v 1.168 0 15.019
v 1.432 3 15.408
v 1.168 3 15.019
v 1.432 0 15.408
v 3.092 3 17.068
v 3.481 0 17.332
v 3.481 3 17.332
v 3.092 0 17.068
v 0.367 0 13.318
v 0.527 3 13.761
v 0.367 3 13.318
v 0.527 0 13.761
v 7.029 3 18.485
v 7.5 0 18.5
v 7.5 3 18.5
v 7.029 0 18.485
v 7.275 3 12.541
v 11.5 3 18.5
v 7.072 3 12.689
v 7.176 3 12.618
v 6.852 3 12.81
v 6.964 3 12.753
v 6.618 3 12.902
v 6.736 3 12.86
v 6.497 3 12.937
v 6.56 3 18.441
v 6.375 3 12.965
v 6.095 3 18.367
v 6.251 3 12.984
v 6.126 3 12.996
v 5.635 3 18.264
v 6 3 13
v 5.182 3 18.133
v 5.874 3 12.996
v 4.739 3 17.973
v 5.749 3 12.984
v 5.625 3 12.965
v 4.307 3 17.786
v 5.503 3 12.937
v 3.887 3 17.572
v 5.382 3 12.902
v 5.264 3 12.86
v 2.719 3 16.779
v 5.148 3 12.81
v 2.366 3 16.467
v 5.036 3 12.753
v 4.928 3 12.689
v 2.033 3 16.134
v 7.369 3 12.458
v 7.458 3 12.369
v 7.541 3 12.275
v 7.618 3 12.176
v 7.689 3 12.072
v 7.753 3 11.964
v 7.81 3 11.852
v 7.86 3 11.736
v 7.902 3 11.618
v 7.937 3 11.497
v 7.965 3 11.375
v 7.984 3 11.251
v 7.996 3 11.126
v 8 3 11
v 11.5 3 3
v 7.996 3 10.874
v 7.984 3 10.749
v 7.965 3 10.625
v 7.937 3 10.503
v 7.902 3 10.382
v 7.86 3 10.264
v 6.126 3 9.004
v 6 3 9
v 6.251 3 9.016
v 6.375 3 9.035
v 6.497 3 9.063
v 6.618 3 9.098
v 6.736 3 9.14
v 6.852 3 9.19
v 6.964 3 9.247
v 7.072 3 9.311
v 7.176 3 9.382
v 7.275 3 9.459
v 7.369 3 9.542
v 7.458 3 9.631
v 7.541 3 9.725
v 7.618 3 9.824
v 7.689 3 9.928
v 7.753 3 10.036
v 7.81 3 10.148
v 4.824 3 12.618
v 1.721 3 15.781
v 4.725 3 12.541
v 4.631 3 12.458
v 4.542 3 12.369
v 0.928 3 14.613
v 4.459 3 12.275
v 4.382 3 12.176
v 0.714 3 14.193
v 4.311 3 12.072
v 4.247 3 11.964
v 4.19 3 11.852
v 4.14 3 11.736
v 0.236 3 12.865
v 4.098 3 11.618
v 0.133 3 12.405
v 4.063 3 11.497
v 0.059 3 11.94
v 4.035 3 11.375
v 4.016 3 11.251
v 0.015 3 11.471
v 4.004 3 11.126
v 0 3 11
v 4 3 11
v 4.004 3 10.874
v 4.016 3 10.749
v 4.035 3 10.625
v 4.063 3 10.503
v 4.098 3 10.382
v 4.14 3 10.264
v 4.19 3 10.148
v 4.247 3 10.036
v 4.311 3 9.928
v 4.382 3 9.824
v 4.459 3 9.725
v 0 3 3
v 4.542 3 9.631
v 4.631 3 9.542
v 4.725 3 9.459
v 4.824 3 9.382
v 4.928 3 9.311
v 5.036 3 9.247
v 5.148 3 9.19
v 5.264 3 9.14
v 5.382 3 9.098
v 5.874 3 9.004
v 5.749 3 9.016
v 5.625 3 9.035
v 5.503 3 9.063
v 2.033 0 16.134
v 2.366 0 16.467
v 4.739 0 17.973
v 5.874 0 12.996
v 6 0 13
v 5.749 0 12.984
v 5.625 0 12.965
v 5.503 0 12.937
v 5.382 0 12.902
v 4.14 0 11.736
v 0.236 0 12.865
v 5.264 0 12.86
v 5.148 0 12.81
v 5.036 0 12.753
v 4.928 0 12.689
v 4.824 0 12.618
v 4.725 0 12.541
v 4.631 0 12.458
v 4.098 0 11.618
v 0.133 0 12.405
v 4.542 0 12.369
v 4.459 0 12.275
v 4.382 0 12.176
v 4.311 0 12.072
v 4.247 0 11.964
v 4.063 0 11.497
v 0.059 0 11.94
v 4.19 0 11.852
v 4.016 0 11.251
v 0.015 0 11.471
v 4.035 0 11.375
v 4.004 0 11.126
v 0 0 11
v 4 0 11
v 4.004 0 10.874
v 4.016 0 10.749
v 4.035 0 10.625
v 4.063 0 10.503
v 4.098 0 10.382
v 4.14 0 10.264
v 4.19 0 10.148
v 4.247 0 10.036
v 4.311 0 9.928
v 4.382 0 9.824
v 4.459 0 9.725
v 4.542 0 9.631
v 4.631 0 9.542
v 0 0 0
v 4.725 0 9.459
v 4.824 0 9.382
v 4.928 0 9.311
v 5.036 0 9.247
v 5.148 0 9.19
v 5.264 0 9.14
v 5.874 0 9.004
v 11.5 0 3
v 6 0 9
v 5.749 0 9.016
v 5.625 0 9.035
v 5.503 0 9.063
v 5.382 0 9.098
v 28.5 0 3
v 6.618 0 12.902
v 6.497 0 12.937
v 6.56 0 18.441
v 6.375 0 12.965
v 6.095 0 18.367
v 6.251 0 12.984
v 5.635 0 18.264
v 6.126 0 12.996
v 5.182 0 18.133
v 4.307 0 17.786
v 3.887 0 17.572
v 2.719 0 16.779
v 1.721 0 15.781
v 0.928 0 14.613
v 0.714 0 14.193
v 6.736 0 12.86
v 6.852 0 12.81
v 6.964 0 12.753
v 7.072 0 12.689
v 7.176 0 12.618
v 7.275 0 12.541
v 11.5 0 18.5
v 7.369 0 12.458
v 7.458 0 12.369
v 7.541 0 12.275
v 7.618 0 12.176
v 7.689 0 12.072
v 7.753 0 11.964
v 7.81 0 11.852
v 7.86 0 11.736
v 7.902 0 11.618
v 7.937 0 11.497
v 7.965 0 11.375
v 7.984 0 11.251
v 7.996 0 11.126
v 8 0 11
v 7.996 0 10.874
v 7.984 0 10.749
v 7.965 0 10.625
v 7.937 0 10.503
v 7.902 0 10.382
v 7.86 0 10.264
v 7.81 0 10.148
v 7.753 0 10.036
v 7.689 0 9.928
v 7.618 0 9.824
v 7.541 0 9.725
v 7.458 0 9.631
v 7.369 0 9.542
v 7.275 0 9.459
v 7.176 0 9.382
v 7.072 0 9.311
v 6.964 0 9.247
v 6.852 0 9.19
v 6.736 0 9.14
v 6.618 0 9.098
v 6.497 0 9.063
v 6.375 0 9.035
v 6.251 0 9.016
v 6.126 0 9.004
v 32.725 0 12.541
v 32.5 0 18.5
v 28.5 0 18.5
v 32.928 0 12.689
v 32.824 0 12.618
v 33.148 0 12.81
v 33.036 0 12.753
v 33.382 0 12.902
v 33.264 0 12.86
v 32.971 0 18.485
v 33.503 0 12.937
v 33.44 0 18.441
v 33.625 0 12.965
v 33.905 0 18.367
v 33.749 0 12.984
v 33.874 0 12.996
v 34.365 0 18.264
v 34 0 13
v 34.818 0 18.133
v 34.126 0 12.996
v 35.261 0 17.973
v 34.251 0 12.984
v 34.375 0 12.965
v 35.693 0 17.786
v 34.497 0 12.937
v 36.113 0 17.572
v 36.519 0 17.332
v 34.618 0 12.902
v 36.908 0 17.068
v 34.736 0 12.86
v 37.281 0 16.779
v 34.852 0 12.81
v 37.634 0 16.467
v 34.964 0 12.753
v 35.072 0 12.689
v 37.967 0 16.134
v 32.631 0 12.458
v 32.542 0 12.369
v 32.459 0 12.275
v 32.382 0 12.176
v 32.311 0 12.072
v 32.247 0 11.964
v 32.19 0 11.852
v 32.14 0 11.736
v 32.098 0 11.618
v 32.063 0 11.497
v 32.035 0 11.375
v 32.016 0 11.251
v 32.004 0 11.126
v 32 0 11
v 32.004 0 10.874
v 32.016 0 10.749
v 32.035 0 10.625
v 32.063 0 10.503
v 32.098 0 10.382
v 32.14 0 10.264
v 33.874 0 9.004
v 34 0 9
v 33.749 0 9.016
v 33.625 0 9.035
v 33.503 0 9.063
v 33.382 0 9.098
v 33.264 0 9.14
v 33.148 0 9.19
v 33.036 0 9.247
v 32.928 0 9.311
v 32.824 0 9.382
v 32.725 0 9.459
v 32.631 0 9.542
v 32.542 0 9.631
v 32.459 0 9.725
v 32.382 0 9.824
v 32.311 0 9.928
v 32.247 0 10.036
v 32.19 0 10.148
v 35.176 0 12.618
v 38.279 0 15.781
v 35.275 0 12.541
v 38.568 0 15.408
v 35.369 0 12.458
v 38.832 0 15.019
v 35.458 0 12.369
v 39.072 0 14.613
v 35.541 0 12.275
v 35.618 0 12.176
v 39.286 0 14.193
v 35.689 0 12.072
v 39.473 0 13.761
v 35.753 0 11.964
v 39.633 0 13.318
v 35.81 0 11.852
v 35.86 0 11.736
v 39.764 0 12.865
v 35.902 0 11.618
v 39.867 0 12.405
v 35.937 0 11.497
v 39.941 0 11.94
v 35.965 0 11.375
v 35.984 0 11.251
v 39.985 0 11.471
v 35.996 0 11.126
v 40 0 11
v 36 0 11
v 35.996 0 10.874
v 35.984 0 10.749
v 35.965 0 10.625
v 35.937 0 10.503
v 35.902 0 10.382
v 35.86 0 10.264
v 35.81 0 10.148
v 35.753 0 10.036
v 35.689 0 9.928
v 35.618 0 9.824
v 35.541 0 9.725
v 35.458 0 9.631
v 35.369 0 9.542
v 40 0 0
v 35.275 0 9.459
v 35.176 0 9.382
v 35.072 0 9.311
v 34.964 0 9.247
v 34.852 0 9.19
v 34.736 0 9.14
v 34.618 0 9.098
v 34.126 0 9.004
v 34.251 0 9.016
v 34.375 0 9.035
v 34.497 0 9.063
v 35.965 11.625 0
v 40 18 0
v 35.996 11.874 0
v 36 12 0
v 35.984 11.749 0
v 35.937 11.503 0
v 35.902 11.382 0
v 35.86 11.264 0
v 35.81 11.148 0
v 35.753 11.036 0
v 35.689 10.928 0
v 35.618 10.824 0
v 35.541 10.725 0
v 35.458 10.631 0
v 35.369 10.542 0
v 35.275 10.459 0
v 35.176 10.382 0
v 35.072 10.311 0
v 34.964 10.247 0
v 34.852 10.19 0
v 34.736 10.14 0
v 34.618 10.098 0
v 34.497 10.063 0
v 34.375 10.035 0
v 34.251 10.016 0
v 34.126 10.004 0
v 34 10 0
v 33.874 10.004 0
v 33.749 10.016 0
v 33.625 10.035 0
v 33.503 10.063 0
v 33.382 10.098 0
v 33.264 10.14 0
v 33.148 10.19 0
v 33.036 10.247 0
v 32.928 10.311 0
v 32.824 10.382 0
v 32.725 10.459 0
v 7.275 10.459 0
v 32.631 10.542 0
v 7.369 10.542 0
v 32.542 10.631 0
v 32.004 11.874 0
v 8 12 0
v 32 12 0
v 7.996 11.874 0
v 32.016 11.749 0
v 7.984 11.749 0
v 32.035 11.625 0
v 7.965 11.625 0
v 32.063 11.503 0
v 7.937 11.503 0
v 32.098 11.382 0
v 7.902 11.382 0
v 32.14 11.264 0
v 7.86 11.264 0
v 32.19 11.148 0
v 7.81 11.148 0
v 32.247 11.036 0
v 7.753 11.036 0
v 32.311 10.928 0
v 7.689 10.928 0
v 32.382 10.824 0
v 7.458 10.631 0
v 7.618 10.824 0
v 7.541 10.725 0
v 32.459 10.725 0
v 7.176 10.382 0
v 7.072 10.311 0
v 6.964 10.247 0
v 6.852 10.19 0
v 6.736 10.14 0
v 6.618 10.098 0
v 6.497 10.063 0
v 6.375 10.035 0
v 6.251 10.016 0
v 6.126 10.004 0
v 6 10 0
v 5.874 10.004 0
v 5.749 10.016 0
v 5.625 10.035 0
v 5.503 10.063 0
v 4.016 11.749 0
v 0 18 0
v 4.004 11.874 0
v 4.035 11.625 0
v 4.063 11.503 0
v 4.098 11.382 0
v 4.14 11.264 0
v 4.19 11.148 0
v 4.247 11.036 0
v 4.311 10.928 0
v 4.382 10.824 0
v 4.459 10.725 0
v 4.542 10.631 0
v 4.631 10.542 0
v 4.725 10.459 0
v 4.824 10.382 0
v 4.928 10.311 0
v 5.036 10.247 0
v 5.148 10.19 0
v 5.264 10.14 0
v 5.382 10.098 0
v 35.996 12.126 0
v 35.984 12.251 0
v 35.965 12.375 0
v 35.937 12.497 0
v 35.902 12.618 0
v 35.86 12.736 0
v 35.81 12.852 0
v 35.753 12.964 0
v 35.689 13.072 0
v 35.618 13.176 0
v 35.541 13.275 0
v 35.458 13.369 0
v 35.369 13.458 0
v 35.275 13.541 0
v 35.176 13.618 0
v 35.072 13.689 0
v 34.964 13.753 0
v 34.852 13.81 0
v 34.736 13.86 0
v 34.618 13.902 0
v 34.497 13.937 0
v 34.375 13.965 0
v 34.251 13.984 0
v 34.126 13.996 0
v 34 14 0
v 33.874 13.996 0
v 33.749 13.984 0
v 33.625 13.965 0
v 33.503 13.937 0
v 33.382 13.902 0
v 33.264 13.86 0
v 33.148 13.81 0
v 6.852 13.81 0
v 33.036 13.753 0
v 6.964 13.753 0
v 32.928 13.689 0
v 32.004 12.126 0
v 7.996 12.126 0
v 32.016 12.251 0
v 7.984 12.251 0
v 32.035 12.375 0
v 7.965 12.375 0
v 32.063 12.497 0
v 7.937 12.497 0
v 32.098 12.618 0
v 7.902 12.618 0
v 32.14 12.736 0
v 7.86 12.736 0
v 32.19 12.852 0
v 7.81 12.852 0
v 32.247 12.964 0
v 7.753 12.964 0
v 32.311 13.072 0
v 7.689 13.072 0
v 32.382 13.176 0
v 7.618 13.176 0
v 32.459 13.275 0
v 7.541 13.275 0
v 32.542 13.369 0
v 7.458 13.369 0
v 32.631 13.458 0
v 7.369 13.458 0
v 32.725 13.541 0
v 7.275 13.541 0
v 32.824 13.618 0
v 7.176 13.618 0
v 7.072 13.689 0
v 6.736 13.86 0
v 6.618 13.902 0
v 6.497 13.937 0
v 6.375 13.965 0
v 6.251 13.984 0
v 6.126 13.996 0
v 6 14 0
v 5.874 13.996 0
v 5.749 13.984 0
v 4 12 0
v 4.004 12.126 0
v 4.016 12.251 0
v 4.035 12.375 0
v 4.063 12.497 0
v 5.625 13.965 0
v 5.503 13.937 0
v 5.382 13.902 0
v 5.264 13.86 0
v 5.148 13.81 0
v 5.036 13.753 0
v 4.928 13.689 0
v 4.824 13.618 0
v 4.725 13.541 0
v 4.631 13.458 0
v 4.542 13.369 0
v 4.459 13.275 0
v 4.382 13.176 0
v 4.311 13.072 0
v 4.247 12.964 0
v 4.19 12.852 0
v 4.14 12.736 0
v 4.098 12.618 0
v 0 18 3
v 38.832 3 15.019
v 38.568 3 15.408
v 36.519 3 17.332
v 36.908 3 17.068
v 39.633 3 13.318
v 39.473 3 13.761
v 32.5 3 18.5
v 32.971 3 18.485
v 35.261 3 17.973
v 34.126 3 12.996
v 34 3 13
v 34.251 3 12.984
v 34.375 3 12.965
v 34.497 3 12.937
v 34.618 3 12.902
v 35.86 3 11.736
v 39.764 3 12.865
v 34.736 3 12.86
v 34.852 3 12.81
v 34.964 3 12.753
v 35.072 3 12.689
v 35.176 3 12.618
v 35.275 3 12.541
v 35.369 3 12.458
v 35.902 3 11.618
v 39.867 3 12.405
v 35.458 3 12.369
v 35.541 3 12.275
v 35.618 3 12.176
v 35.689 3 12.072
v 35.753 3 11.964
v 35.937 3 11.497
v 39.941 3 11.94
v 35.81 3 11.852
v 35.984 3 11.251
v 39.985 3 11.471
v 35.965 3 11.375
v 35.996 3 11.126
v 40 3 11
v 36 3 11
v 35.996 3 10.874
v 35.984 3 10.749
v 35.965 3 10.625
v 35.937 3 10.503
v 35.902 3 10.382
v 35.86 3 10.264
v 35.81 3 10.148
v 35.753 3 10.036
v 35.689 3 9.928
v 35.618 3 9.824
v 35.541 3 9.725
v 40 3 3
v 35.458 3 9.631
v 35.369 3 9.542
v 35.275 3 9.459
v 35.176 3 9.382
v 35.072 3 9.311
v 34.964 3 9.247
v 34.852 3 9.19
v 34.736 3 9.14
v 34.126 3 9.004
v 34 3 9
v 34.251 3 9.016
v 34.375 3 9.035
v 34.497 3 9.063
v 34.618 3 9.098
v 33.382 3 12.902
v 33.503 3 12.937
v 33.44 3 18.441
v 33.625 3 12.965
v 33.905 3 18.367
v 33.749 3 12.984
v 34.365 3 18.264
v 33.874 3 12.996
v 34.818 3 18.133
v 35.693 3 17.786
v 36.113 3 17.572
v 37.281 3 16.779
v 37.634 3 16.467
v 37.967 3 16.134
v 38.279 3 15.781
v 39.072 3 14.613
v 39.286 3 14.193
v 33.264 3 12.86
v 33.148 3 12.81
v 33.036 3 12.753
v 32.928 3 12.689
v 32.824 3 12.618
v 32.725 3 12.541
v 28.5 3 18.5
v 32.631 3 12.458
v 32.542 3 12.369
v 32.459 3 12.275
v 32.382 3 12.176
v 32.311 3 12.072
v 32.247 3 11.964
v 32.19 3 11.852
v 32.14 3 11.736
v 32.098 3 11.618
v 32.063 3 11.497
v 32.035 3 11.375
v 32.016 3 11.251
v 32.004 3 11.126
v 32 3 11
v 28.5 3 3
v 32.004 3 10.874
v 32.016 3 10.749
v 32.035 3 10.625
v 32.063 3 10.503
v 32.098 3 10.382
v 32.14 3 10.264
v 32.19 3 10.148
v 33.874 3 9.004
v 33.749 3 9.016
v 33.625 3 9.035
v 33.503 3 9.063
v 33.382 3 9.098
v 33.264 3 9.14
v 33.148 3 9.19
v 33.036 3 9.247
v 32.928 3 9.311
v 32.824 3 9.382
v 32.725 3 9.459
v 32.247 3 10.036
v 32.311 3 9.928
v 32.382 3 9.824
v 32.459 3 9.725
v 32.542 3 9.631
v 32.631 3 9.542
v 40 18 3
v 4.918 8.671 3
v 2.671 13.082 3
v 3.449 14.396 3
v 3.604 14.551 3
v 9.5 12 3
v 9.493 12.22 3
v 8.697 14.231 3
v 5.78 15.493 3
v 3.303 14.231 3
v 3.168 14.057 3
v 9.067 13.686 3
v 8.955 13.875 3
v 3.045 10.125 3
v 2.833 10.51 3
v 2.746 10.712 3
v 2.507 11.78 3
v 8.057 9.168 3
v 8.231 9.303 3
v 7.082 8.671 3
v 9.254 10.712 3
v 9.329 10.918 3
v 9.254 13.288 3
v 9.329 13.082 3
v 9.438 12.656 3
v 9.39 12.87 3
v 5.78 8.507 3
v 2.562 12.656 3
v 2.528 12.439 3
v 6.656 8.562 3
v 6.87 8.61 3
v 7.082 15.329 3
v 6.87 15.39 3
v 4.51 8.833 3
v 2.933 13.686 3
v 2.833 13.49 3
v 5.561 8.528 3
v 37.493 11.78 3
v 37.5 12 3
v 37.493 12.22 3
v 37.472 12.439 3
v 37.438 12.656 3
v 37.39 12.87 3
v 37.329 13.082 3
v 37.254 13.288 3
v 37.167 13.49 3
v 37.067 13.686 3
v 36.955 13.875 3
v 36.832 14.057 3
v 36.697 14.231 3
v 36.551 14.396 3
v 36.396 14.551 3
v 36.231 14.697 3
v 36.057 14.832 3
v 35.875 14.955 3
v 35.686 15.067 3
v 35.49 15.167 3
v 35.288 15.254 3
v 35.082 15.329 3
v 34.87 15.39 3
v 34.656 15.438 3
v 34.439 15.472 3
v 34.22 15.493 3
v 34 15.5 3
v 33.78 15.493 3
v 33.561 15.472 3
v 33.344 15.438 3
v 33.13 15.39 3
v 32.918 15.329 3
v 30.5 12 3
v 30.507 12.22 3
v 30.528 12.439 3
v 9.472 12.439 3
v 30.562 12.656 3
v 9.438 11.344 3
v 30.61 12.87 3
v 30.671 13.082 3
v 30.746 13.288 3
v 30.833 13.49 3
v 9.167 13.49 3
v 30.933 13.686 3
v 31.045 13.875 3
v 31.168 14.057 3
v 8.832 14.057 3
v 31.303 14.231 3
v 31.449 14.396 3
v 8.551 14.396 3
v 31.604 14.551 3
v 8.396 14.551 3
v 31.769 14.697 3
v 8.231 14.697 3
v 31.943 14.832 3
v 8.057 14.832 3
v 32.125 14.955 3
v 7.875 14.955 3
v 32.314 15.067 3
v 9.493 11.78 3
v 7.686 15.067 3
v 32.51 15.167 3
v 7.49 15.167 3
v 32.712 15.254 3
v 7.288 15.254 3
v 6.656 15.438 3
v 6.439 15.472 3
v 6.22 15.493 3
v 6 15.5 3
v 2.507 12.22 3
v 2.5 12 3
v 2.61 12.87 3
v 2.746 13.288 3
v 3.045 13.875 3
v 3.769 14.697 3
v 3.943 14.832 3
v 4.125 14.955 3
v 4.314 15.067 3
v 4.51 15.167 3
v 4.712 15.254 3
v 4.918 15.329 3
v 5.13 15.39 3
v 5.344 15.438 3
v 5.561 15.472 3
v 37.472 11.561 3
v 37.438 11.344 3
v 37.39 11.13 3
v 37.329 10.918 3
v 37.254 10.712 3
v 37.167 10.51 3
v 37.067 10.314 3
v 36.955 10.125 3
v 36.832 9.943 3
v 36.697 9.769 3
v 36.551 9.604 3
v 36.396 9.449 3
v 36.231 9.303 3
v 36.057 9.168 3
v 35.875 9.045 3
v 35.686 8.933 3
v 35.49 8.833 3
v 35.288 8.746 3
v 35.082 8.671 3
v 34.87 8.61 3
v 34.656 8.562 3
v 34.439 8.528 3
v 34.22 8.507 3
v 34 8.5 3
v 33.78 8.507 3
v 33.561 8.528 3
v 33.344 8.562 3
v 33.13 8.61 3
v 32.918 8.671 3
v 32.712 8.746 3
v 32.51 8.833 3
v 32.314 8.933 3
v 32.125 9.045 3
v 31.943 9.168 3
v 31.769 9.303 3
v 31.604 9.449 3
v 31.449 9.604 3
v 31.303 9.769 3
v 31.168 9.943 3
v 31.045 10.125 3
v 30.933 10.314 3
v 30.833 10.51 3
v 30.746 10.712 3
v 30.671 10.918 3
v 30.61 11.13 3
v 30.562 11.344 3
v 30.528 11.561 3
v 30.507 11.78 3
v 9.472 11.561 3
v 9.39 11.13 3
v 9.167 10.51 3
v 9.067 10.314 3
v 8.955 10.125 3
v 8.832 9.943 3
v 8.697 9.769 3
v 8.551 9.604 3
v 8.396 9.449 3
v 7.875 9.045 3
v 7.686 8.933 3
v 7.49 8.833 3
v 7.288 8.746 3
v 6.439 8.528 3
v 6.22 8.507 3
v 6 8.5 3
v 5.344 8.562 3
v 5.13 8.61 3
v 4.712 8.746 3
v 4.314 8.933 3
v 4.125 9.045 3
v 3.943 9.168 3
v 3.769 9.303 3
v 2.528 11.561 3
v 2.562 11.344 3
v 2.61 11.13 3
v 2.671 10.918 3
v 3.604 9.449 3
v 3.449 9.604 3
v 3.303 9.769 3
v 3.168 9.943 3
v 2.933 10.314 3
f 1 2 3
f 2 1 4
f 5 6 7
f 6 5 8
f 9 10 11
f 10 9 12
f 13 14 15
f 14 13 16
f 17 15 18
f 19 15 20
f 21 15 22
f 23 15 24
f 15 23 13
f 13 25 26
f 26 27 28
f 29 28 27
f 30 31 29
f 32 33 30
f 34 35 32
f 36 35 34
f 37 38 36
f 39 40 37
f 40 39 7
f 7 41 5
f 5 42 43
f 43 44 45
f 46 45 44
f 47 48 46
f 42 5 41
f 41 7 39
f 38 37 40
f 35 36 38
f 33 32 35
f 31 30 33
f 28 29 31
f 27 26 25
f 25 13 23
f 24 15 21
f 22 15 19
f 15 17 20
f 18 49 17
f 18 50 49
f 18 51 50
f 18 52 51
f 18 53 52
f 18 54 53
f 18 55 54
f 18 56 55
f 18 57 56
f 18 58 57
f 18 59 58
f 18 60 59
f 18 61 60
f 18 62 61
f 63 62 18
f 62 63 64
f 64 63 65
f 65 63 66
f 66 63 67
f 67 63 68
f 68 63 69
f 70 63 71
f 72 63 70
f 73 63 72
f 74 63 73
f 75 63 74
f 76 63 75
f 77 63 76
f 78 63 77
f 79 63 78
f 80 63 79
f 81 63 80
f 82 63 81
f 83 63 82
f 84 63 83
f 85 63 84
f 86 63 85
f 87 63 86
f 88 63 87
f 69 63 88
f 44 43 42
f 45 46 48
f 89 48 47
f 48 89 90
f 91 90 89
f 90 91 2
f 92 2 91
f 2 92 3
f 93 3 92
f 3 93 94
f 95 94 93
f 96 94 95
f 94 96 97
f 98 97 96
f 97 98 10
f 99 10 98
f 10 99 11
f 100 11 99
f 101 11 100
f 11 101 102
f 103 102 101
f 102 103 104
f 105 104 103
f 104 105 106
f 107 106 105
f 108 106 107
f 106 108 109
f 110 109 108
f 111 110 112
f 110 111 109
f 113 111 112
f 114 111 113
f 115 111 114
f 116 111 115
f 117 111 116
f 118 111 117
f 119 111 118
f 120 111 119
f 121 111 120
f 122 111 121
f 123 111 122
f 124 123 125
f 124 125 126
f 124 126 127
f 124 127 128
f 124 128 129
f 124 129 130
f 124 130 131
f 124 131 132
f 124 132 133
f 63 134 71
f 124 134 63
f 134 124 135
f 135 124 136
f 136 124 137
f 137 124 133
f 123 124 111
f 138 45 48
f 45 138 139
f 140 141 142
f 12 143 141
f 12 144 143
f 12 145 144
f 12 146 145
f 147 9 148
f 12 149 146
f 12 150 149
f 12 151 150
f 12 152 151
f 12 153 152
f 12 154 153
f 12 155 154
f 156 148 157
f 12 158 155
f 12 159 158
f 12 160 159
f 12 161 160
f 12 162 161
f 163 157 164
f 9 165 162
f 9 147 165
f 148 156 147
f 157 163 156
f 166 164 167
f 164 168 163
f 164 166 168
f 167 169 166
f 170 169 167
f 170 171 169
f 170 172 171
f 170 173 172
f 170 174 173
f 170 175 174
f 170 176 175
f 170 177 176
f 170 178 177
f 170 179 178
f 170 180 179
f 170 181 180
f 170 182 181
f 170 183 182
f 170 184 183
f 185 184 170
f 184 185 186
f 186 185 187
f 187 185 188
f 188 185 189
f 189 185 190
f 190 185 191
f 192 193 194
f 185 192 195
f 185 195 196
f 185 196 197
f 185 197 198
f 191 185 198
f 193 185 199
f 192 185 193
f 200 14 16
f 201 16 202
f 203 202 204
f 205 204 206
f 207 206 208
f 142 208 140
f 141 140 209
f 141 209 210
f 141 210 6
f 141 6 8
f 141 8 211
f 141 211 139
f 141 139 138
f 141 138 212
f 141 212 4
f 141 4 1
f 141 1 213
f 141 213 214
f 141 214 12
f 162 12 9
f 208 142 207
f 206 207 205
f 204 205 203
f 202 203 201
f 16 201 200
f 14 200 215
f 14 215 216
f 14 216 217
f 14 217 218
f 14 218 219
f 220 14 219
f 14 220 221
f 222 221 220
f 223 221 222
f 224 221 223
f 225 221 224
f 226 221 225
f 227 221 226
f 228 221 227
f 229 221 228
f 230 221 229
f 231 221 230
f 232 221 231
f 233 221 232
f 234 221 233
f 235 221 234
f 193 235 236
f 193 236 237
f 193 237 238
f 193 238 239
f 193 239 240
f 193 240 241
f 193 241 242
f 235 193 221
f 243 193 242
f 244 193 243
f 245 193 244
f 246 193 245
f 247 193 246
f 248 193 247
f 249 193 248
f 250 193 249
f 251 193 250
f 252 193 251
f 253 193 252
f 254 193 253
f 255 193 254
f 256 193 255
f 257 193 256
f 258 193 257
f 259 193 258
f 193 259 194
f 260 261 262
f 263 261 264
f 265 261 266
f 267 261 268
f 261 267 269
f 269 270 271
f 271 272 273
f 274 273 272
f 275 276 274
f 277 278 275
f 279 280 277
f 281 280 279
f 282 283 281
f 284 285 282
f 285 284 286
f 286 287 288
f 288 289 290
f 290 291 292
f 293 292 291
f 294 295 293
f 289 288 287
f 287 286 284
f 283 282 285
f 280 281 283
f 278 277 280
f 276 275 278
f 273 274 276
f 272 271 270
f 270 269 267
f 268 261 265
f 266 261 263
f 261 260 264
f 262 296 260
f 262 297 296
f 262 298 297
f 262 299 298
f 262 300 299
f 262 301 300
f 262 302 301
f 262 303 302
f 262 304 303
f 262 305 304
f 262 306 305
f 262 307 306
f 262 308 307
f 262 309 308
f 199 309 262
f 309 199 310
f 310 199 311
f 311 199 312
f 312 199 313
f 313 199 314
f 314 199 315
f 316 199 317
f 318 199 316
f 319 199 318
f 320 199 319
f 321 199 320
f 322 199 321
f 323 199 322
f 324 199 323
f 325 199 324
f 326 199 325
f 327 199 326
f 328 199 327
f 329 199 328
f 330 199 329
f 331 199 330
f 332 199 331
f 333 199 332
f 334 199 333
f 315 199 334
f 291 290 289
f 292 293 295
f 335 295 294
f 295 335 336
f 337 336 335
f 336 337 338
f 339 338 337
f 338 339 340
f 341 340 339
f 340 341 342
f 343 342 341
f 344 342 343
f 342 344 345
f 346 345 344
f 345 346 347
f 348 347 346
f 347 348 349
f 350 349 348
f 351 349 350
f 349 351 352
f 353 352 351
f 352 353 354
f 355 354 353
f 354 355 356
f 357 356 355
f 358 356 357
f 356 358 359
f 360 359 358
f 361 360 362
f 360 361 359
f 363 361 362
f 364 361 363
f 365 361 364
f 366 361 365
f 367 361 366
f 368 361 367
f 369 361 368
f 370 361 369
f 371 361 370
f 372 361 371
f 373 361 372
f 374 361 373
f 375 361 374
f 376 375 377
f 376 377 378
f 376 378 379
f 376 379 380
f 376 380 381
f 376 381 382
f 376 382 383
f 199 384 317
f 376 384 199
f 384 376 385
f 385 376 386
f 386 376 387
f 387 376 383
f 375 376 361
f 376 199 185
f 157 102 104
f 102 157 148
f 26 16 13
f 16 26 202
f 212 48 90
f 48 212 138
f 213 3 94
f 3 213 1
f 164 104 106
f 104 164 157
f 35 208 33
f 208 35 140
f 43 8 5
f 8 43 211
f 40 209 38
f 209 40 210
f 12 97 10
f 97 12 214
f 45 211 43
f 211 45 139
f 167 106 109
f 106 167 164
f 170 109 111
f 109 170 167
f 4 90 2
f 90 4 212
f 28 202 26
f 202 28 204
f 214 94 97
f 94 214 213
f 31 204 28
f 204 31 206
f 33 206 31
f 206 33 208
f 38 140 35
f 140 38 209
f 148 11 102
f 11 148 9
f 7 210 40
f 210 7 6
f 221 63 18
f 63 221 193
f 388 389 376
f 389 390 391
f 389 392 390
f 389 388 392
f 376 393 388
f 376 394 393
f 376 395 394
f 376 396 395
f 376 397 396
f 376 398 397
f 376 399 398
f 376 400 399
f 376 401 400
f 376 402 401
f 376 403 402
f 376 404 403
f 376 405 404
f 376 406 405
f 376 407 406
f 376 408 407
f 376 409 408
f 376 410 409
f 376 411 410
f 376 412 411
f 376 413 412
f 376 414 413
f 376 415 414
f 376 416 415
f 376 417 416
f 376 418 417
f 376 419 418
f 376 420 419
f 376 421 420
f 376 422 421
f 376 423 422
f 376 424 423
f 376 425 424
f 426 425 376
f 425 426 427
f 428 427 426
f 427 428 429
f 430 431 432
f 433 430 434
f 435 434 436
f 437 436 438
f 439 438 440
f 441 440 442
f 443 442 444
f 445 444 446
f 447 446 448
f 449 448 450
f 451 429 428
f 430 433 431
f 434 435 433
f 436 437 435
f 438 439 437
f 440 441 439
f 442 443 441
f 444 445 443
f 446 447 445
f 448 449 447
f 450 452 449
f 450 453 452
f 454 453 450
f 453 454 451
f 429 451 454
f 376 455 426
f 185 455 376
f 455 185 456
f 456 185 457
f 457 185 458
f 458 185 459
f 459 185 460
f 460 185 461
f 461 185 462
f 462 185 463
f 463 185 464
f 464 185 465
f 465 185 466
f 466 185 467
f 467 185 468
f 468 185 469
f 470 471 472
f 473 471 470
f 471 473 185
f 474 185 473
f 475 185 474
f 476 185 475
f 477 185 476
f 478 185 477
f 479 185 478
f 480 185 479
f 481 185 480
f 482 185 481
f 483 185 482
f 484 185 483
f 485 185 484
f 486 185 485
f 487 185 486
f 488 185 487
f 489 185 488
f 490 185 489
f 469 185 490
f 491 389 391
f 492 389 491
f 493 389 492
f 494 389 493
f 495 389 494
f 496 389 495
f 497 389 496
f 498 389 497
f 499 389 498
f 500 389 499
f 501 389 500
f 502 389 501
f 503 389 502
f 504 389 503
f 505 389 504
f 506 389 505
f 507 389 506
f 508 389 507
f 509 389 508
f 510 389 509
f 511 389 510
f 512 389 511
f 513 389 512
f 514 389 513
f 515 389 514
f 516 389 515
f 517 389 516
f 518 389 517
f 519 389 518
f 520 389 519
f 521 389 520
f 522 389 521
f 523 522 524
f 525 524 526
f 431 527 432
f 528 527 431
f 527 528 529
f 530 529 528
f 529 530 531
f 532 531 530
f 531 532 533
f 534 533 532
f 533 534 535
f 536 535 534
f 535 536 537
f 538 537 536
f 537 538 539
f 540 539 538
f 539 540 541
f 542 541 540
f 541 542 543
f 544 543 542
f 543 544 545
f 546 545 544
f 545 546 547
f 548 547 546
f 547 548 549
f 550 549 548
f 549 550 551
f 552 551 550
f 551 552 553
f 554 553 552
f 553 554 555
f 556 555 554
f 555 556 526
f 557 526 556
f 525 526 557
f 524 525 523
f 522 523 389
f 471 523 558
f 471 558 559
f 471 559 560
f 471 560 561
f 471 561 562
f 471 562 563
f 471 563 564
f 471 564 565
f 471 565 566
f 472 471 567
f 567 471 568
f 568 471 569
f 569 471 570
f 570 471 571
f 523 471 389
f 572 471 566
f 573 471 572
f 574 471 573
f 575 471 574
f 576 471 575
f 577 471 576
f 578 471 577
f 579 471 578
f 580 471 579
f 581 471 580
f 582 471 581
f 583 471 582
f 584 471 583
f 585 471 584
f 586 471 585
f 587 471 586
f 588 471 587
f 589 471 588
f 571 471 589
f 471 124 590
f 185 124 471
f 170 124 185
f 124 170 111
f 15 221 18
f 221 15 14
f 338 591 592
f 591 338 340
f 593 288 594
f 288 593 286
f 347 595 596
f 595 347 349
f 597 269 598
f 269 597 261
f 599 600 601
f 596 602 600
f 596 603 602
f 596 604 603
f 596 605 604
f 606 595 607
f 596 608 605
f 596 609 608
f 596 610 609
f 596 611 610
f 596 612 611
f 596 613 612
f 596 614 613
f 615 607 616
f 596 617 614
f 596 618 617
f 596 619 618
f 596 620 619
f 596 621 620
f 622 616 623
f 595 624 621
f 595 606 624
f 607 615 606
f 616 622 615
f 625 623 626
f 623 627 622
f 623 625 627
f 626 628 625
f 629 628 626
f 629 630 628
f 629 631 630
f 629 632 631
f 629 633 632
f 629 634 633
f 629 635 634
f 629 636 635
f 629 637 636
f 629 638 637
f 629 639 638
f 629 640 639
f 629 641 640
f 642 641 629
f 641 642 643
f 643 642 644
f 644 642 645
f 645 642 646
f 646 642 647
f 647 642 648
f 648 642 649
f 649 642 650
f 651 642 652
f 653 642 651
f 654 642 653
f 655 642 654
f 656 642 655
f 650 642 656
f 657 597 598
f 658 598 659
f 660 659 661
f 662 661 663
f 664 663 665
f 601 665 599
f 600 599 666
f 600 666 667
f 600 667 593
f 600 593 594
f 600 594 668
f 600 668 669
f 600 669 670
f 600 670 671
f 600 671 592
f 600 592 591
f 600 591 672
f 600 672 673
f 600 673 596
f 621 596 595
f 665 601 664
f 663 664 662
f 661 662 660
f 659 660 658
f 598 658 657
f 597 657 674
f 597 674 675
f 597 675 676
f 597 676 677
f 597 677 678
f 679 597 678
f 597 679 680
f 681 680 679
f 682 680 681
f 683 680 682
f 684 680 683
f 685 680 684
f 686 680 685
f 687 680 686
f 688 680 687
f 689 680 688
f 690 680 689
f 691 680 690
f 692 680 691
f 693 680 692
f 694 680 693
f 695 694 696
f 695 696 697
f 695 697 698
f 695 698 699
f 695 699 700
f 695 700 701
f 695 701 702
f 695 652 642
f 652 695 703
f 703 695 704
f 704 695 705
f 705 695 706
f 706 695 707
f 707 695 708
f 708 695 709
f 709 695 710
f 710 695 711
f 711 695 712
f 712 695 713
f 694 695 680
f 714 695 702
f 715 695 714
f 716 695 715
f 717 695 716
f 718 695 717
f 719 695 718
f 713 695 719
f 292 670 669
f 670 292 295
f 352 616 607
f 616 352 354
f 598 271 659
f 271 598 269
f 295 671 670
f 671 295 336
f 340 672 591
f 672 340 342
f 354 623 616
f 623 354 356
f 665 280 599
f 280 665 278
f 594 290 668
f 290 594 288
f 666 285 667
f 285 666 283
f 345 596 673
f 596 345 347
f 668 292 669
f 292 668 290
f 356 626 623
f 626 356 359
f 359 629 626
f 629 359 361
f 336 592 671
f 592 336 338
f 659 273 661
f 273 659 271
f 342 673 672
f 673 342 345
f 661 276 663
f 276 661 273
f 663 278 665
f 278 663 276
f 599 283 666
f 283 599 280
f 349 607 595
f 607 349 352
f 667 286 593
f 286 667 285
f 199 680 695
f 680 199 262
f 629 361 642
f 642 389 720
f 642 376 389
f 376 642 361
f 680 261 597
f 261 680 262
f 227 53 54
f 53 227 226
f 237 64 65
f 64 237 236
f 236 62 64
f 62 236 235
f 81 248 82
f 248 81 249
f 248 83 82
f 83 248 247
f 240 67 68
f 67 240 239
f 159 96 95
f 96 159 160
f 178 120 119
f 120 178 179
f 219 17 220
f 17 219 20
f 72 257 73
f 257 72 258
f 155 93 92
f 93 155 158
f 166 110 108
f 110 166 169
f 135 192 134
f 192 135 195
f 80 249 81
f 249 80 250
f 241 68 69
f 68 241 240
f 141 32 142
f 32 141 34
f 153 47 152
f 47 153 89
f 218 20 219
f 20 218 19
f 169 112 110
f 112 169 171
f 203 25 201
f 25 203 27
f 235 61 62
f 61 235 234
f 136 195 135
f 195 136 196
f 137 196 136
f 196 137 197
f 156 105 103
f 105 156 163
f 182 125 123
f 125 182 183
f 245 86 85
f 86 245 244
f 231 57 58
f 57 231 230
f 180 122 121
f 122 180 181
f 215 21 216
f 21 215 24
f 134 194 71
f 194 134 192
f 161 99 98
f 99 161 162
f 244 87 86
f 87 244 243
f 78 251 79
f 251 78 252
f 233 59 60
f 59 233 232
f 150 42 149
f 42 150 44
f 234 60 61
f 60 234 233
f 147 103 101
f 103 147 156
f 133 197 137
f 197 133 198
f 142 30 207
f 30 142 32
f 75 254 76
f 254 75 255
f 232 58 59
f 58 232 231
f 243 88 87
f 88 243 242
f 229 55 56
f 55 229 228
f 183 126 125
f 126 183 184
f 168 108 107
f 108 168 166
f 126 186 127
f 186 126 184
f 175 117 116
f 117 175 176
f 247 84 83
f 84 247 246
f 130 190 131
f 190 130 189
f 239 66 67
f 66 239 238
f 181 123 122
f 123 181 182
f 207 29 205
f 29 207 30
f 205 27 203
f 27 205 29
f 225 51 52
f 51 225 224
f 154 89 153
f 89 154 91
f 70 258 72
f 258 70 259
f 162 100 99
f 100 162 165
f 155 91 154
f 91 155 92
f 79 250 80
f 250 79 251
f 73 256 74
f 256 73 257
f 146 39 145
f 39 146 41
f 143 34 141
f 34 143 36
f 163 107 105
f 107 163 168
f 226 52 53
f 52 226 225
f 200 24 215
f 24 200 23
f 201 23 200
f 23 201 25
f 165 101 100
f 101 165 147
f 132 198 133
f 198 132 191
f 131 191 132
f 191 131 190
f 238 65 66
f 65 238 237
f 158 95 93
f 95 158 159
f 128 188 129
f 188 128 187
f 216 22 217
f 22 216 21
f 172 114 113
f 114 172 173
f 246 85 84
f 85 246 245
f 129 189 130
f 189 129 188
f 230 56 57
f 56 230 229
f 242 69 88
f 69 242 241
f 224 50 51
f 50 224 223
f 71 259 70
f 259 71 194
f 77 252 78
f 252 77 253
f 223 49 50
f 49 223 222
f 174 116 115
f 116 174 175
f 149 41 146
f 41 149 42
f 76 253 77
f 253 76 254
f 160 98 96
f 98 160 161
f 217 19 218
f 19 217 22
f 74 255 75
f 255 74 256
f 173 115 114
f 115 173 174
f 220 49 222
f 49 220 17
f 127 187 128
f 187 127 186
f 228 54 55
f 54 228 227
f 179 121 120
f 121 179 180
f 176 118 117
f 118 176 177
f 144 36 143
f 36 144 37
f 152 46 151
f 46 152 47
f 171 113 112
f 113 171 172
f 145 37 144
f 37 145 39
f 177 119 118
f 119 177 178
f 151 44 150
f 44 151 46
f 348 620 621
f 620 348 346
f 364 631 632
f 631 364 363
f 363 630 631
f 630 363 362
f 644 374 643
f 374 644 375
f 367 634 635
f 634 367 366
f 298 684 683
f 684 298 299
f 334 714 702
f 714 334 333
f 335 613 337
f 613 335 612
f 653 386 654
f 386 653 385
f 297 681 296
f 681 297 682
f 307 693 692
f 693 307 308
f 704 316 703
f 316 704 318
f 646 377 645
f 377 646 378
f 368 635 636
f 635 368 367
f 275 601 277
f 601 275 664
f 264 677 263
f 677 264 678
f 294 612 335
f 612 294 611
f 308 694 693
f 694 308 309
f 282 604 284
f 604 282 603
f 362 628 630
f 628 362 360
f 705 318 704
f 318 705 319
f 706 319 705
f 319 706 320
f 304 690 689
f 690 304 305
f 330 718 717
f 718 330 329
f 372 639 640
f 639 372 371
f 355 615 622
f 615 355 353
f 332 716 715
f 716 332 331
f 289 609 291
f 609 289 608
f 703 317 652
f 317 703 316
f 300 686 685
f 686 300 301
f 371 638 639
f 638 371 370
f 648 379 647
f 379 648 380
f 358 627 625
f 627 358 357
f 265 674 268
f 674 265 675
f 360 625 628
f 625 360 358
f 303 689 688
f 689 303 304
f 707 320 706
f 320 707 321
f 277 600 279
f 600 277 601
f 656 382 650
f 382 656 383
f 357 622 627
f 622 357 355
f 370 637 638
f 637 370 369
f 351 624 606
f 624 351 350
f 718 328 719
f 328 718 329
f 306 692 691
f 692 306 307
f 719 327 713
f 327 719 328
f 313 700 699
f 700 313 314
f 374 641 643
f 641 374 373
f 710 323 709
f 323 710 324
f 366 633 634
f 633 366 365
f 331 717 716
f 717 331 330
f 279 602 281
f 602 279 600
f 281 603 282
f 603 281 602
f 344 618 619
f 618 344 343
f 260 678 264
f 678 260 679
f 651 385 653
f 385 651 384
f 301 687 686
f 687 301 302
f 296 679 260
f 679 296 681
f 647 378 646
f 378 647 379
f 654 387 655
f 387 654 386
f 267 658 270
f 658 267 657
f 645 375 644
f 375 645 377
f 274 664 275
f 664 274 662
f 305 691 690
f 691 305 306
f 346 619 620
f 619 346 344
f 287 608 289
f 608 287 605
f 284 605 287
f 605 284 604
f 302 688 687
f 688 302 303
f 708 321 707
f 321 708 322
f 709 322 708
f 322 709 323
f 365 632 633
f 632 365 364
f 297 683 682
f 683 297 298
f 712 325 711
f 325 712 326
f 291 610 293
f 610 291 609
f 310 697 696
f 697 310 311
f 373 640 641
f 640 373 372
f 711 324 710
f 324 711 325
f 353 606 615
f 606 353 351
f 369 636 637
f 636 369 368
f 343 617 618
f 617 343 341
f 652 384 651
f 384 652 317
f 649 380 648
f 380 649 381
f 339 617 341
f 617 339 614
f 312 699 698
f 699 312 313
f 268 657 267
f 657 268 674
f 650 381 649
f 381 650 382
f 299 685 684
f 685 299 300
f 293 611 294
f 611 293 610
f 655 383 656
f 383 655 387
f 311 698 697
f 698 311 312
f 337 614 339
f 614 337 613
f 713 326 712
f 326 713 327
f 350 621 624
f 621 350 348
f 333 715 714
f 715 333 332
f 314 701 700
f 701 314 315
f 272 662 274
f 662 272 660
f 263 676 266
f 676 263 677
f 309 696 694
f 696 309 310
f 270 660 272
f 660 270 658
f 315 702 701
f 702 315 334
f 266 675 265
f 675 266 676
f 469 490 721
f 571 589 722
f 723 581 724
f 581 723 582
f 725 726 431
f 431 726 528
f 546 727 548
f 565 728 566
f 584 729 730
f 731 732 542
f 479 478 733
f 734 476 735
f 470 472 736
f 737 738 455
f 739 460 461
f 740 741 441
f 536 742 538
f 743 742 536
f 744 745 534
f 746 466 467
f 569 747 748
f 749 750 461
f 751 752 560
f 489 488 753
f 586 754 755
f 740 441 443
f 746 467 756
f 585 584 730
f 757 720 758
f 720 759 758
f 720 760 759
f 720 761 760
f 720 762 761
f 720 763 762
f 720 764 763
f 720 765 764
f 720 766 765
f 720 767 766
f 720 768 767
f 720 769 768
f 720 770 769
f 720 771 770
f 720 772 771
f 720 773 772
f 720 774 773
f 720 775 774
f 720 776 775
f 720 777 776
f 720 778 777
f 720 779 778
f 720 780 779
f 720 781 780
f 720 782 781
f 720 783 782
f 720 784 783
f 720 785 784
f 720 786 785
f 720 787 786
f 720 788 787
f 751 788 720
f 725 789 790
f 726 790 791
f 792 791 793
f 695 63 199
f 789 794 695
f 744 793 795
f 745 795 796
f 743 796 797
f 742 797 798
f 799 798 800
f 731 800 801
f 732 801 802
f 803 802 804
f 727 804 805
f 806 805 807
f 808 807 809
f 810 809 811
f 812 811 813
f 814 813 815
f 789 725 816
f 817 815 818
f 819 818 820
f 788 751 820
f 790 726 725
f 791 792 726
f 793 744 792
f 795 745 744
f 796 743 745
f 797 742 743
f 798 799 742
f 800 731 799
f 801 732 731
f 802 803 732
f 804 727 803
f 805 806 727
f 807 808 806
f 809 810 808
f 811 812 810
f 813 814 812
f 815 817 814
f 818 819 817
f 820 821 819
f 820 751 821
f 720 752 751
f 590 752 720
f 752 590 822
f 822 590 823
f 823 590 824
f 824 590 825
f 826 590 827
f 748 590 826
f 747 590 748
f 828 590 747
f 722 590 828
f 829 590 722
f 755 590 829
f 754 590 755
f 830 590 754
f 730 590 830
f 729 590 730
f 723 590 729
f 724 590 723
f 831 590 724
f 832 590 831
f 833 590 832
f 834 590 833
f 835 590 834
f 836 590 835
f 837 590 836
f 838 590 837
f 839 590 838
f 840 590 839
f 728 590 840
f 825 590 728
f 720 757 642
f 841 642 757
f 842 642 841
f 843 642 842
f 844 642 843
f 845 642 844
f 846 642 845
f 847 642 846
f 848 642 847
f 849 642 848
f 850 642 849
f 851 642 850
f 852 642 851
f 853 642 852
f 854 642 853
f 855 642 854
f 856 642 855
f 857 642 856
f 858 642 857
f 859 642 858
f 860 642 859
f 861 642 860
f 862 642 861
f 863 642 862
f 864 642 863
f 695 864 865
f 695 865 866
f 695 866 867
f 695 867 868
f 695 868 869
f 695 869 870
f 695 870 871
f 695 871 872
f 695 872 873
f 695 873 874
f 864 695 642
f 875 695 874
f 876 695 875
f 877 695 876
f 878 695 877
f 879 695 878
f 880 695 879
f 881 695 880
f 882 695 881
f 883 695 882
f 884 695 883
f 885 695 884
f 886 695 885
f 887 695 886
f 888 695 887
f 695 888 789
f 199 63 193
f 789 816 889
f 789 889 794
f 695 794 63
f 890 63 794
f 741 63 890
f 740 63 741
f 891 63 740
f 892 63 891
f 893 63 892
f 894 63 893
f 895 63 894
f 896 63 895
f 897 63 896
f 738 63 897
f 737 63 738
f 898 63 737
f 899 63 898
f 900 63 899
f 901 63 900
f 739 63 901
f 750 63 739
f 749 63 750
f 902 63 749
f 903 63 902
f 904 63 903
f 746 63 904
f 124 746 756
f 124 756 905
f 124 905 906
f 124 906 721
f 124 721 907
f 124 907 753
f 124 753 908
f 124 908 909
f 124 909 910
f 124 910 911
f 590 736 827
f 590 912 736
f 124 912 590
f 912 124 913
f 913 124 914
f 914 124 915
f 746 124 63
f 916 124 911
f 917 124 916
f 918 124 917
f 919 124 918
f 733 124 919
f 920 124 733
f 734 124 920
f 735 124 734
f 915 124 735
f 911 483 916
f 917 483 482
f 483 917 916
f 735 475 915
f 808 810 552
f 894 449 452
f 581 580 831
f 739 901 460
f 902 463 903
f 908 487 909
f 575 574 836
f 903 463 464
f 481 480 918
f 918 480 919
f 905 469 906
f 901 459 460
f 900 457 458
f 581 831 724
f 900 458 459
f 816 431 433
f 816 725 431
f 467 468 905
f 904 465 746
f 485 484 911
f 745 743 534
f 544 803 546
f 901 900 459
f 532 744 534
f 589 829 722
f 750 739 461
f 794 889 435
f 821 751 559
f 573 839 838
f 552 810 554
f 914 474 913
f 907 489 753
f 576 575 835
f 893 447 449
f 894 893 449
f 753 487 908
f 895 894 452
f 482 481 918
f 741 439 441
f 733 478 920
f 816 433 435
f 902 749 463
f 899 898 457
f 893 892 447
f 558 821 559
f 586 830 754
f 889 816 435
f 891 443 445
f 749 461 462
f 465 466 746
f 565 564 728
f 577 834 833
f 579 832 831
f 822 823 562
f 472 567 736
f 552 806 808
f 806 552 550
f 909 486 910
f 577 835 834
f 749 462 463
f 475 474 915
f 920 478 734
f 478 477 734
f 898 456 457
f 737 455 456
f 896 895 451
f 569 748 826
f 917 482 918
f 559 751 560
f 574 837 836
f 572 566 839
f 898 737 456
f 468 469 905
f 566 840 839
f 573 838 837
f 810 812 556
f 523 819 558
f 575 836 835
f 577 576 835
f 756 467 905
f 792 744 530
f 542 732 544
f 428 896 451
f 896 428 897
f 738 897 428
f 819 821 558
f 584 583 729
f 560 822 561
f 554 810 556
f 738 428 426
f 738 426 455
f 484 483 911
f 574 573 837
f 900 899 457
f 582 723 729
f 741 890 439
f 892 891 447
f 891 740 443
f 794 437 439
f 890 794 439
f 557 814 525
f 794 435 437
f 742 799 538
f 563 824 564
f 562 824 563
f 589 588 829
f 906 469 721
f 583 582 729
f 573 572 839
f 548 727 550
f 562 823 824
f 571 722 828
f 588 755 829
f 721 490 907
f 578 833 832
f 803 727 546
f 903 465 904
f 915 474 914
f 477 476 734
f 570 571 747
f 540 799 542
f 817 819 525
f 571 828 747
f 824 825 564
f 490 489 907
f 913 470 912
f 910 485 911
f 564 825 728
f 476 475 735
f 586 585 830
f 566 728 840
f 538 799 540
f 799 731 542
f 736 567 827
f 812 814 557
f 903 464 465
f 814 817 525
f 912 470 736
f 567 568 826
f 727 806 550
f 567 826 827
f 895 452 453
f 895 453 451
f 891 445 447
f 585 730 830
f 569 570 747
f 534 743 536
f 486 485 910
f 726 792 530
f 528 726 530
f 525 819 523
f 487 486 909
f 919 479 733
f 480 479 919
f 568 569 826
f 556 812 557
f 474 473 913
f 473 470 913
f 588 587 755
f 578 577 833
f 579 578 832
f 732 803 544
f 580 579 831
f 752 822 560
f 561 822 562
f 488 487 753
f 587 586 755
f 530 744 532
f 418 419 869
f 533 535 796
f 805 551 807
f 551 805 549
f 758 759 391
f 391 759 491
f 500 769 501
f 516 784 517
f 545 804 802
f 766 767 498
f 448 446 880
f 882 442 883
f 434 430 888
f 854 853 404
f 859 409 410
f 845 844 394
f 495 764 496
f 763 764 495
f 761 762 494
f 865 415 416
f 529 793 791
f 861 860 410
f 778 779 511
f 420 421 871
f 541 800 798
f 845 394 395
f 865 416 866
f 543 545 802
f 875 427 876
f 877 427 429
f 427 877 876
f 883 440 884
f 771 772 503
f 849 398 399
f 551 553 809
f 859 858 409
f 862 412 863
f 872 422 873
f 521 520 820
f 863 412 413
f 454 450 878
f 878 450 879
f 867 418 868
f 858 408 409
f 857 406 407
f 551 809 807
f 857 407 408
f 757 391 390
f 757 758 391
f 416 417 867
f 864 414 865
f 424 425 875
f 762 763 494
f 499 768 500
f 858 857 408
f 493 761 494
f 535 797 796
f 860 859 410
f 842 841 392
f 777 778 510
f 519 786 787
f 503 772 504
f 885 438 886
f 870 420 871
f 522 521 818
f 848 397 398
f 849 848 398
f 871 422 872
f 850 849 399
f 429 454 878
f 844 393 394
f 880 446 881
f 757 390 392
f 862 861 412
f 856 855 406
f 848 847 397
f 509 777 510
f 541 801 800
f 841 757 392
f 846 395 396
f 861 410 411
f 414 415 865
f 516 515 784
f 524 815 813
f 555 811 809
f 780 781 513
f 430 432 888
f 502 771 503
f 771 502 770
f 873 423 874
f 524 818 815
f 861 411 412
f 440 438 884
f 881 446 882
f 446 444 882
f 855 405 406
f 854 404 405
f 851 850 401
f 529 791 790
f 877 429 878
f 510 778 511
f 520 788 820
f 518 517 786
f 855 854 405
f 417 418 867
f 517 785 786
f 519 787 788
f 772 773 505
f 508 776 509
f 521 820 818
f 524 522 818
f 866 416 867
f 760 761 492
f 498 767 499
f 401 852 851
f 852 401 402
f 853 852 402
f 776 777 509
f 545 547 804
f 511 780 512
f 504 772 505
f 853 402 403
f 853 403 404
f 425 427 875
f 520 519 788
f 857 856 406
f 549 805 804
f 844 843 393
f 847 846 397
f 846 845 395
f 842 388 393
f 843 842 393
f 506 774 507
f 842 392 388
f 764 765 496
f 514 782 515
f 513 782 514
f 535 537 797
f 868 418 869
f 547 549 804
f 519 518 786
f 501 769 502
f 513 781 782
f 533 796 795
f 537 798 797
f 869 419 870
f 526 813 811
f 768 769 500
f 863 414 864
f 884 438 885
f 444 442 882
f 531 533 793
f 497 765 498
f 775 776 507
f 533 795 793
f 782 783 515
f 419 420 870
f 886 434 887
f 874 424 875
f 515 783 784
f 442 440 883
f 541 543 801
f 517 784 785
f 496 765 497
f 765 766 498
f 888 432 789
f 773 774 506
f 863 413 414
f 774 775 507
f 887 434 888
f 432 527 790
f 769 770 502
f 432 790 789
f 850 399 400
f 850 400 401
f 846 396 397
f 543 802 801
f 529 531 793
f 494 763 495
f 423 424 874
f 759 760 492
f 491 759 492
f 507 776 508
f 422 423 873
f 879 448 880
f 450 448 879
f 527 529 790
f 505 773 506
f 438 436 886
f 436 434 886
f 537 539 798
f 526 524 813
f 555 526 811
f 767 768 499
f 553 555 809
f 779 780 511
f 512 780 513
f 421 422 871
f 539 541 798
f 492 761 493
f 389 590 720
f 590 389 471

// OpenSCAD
// file: ../libraries/helpers.scad
module halfcylinder(h, r)
{
	difference()
	{
		cylinder(h = h, r = r);
		translate([ 0, -r - 0.1, -0.1 ])
		cube([ r + 0.1, r * 2 + 0.2, h + 0.2 ]);
	} // df
} // mod

module quartercylinder(h, r)
{
	difference()
	{
		cylinder(h = h, r = r);
		translate([ 0, -r - 0.1, -0.1 ])
		cube([ r + 0.1, r * 2 + 0.2, h + 0.2 ]);
		translate([ -r, 0, 0 ])
		cube([ r * 2 + 0.2, r + 0.1, h + 0.2 ]);
	} // df
} // mod
// main file
use <../libraries/helpers.scad>

width = 40;
mount_screw_diameter = 4;
mount_screw_spacing = 28;
mount_height = 15;
mount_thickness = 3;

usb_width = 17;
usb_height = 16;

base_screw_diameter = 4;
base_screw_head_diameter = 7;
base_depth = 18;
base_thickness = 3;

$fn = 100;

module usb_bracket()
{
	union()
	{
		mount();
		base();
	}
}

module base()
{
	difference()
	{
		cube([ width, base_depth, base_thickness ]);
		base_screws();
	}
}

module mount()
{
	difference()
	{
		brackets();
		mount_screws();
	}
}

module brackets()
{
	side_width = (width - usb_width) / 2;
	height = mount_thickness + usb_height / 2;
	raduis = mount_height / 2;
	bracket();

	translate([ width, 0, 0 ])
	mirror([ 1, 0, 0 ]) bracket();

	// translate([ side_width, 0, height ])
	// rotate([ 90, 0, 180 ])
	// quartercylinder(r = mount_height, h = mount_thickness);
}

module bracket()
{
	side_width = (width - usb_width) / 2;
	height = mount_thickness + usb_height / 2;
	raduis = mount_height / 2;

	union()
	{
		cube([ side_width, mount_thickness, height ]);
		translate([ raduis, 0, height ])
		cube([ side_width - raduis, mount_thickness, raduis ]);
		translate([ raduis, 0, height ])
		rotate([ -90, 0, 0 ])
		quartercylinder(r = raduis, h = mount_thickness);
	}
}

module mount_screws()
{
	translate([ (width - mount_screw_spacing) / 2, 0, 0 ])
	mount_screw();
	translate([ ((width - mount_screw_spacing) / 2) + mount_screw_spacing, 0, 0 ])
	mount_screw();
}

module mount_screw()
{
	translate([ 0, 0, usb_height / 2 + mount_thickness ])
	rotate([ -90, 0, 0 ])
	cylinder(d = mount_screw_diameter, h = mount_thickness);
}

module base_screws()
{
	translate([ (width - mount_screw_spacing) / 2, 0, 0 ])
	base_screw();
	translate([ ((width - mount_screw_spacing) / 2) + mount_screw_spacing, 0, 0 ])
	base_screw();
}

module base_screw()
{
	translate([ 0, (base_depth / 2) + mount_thickness, 0 ])
	cylinder(d1 = base_screw_diameter, d2 = base_screw_head_diameter, h = base_thickness);
}

usb_bracket();
